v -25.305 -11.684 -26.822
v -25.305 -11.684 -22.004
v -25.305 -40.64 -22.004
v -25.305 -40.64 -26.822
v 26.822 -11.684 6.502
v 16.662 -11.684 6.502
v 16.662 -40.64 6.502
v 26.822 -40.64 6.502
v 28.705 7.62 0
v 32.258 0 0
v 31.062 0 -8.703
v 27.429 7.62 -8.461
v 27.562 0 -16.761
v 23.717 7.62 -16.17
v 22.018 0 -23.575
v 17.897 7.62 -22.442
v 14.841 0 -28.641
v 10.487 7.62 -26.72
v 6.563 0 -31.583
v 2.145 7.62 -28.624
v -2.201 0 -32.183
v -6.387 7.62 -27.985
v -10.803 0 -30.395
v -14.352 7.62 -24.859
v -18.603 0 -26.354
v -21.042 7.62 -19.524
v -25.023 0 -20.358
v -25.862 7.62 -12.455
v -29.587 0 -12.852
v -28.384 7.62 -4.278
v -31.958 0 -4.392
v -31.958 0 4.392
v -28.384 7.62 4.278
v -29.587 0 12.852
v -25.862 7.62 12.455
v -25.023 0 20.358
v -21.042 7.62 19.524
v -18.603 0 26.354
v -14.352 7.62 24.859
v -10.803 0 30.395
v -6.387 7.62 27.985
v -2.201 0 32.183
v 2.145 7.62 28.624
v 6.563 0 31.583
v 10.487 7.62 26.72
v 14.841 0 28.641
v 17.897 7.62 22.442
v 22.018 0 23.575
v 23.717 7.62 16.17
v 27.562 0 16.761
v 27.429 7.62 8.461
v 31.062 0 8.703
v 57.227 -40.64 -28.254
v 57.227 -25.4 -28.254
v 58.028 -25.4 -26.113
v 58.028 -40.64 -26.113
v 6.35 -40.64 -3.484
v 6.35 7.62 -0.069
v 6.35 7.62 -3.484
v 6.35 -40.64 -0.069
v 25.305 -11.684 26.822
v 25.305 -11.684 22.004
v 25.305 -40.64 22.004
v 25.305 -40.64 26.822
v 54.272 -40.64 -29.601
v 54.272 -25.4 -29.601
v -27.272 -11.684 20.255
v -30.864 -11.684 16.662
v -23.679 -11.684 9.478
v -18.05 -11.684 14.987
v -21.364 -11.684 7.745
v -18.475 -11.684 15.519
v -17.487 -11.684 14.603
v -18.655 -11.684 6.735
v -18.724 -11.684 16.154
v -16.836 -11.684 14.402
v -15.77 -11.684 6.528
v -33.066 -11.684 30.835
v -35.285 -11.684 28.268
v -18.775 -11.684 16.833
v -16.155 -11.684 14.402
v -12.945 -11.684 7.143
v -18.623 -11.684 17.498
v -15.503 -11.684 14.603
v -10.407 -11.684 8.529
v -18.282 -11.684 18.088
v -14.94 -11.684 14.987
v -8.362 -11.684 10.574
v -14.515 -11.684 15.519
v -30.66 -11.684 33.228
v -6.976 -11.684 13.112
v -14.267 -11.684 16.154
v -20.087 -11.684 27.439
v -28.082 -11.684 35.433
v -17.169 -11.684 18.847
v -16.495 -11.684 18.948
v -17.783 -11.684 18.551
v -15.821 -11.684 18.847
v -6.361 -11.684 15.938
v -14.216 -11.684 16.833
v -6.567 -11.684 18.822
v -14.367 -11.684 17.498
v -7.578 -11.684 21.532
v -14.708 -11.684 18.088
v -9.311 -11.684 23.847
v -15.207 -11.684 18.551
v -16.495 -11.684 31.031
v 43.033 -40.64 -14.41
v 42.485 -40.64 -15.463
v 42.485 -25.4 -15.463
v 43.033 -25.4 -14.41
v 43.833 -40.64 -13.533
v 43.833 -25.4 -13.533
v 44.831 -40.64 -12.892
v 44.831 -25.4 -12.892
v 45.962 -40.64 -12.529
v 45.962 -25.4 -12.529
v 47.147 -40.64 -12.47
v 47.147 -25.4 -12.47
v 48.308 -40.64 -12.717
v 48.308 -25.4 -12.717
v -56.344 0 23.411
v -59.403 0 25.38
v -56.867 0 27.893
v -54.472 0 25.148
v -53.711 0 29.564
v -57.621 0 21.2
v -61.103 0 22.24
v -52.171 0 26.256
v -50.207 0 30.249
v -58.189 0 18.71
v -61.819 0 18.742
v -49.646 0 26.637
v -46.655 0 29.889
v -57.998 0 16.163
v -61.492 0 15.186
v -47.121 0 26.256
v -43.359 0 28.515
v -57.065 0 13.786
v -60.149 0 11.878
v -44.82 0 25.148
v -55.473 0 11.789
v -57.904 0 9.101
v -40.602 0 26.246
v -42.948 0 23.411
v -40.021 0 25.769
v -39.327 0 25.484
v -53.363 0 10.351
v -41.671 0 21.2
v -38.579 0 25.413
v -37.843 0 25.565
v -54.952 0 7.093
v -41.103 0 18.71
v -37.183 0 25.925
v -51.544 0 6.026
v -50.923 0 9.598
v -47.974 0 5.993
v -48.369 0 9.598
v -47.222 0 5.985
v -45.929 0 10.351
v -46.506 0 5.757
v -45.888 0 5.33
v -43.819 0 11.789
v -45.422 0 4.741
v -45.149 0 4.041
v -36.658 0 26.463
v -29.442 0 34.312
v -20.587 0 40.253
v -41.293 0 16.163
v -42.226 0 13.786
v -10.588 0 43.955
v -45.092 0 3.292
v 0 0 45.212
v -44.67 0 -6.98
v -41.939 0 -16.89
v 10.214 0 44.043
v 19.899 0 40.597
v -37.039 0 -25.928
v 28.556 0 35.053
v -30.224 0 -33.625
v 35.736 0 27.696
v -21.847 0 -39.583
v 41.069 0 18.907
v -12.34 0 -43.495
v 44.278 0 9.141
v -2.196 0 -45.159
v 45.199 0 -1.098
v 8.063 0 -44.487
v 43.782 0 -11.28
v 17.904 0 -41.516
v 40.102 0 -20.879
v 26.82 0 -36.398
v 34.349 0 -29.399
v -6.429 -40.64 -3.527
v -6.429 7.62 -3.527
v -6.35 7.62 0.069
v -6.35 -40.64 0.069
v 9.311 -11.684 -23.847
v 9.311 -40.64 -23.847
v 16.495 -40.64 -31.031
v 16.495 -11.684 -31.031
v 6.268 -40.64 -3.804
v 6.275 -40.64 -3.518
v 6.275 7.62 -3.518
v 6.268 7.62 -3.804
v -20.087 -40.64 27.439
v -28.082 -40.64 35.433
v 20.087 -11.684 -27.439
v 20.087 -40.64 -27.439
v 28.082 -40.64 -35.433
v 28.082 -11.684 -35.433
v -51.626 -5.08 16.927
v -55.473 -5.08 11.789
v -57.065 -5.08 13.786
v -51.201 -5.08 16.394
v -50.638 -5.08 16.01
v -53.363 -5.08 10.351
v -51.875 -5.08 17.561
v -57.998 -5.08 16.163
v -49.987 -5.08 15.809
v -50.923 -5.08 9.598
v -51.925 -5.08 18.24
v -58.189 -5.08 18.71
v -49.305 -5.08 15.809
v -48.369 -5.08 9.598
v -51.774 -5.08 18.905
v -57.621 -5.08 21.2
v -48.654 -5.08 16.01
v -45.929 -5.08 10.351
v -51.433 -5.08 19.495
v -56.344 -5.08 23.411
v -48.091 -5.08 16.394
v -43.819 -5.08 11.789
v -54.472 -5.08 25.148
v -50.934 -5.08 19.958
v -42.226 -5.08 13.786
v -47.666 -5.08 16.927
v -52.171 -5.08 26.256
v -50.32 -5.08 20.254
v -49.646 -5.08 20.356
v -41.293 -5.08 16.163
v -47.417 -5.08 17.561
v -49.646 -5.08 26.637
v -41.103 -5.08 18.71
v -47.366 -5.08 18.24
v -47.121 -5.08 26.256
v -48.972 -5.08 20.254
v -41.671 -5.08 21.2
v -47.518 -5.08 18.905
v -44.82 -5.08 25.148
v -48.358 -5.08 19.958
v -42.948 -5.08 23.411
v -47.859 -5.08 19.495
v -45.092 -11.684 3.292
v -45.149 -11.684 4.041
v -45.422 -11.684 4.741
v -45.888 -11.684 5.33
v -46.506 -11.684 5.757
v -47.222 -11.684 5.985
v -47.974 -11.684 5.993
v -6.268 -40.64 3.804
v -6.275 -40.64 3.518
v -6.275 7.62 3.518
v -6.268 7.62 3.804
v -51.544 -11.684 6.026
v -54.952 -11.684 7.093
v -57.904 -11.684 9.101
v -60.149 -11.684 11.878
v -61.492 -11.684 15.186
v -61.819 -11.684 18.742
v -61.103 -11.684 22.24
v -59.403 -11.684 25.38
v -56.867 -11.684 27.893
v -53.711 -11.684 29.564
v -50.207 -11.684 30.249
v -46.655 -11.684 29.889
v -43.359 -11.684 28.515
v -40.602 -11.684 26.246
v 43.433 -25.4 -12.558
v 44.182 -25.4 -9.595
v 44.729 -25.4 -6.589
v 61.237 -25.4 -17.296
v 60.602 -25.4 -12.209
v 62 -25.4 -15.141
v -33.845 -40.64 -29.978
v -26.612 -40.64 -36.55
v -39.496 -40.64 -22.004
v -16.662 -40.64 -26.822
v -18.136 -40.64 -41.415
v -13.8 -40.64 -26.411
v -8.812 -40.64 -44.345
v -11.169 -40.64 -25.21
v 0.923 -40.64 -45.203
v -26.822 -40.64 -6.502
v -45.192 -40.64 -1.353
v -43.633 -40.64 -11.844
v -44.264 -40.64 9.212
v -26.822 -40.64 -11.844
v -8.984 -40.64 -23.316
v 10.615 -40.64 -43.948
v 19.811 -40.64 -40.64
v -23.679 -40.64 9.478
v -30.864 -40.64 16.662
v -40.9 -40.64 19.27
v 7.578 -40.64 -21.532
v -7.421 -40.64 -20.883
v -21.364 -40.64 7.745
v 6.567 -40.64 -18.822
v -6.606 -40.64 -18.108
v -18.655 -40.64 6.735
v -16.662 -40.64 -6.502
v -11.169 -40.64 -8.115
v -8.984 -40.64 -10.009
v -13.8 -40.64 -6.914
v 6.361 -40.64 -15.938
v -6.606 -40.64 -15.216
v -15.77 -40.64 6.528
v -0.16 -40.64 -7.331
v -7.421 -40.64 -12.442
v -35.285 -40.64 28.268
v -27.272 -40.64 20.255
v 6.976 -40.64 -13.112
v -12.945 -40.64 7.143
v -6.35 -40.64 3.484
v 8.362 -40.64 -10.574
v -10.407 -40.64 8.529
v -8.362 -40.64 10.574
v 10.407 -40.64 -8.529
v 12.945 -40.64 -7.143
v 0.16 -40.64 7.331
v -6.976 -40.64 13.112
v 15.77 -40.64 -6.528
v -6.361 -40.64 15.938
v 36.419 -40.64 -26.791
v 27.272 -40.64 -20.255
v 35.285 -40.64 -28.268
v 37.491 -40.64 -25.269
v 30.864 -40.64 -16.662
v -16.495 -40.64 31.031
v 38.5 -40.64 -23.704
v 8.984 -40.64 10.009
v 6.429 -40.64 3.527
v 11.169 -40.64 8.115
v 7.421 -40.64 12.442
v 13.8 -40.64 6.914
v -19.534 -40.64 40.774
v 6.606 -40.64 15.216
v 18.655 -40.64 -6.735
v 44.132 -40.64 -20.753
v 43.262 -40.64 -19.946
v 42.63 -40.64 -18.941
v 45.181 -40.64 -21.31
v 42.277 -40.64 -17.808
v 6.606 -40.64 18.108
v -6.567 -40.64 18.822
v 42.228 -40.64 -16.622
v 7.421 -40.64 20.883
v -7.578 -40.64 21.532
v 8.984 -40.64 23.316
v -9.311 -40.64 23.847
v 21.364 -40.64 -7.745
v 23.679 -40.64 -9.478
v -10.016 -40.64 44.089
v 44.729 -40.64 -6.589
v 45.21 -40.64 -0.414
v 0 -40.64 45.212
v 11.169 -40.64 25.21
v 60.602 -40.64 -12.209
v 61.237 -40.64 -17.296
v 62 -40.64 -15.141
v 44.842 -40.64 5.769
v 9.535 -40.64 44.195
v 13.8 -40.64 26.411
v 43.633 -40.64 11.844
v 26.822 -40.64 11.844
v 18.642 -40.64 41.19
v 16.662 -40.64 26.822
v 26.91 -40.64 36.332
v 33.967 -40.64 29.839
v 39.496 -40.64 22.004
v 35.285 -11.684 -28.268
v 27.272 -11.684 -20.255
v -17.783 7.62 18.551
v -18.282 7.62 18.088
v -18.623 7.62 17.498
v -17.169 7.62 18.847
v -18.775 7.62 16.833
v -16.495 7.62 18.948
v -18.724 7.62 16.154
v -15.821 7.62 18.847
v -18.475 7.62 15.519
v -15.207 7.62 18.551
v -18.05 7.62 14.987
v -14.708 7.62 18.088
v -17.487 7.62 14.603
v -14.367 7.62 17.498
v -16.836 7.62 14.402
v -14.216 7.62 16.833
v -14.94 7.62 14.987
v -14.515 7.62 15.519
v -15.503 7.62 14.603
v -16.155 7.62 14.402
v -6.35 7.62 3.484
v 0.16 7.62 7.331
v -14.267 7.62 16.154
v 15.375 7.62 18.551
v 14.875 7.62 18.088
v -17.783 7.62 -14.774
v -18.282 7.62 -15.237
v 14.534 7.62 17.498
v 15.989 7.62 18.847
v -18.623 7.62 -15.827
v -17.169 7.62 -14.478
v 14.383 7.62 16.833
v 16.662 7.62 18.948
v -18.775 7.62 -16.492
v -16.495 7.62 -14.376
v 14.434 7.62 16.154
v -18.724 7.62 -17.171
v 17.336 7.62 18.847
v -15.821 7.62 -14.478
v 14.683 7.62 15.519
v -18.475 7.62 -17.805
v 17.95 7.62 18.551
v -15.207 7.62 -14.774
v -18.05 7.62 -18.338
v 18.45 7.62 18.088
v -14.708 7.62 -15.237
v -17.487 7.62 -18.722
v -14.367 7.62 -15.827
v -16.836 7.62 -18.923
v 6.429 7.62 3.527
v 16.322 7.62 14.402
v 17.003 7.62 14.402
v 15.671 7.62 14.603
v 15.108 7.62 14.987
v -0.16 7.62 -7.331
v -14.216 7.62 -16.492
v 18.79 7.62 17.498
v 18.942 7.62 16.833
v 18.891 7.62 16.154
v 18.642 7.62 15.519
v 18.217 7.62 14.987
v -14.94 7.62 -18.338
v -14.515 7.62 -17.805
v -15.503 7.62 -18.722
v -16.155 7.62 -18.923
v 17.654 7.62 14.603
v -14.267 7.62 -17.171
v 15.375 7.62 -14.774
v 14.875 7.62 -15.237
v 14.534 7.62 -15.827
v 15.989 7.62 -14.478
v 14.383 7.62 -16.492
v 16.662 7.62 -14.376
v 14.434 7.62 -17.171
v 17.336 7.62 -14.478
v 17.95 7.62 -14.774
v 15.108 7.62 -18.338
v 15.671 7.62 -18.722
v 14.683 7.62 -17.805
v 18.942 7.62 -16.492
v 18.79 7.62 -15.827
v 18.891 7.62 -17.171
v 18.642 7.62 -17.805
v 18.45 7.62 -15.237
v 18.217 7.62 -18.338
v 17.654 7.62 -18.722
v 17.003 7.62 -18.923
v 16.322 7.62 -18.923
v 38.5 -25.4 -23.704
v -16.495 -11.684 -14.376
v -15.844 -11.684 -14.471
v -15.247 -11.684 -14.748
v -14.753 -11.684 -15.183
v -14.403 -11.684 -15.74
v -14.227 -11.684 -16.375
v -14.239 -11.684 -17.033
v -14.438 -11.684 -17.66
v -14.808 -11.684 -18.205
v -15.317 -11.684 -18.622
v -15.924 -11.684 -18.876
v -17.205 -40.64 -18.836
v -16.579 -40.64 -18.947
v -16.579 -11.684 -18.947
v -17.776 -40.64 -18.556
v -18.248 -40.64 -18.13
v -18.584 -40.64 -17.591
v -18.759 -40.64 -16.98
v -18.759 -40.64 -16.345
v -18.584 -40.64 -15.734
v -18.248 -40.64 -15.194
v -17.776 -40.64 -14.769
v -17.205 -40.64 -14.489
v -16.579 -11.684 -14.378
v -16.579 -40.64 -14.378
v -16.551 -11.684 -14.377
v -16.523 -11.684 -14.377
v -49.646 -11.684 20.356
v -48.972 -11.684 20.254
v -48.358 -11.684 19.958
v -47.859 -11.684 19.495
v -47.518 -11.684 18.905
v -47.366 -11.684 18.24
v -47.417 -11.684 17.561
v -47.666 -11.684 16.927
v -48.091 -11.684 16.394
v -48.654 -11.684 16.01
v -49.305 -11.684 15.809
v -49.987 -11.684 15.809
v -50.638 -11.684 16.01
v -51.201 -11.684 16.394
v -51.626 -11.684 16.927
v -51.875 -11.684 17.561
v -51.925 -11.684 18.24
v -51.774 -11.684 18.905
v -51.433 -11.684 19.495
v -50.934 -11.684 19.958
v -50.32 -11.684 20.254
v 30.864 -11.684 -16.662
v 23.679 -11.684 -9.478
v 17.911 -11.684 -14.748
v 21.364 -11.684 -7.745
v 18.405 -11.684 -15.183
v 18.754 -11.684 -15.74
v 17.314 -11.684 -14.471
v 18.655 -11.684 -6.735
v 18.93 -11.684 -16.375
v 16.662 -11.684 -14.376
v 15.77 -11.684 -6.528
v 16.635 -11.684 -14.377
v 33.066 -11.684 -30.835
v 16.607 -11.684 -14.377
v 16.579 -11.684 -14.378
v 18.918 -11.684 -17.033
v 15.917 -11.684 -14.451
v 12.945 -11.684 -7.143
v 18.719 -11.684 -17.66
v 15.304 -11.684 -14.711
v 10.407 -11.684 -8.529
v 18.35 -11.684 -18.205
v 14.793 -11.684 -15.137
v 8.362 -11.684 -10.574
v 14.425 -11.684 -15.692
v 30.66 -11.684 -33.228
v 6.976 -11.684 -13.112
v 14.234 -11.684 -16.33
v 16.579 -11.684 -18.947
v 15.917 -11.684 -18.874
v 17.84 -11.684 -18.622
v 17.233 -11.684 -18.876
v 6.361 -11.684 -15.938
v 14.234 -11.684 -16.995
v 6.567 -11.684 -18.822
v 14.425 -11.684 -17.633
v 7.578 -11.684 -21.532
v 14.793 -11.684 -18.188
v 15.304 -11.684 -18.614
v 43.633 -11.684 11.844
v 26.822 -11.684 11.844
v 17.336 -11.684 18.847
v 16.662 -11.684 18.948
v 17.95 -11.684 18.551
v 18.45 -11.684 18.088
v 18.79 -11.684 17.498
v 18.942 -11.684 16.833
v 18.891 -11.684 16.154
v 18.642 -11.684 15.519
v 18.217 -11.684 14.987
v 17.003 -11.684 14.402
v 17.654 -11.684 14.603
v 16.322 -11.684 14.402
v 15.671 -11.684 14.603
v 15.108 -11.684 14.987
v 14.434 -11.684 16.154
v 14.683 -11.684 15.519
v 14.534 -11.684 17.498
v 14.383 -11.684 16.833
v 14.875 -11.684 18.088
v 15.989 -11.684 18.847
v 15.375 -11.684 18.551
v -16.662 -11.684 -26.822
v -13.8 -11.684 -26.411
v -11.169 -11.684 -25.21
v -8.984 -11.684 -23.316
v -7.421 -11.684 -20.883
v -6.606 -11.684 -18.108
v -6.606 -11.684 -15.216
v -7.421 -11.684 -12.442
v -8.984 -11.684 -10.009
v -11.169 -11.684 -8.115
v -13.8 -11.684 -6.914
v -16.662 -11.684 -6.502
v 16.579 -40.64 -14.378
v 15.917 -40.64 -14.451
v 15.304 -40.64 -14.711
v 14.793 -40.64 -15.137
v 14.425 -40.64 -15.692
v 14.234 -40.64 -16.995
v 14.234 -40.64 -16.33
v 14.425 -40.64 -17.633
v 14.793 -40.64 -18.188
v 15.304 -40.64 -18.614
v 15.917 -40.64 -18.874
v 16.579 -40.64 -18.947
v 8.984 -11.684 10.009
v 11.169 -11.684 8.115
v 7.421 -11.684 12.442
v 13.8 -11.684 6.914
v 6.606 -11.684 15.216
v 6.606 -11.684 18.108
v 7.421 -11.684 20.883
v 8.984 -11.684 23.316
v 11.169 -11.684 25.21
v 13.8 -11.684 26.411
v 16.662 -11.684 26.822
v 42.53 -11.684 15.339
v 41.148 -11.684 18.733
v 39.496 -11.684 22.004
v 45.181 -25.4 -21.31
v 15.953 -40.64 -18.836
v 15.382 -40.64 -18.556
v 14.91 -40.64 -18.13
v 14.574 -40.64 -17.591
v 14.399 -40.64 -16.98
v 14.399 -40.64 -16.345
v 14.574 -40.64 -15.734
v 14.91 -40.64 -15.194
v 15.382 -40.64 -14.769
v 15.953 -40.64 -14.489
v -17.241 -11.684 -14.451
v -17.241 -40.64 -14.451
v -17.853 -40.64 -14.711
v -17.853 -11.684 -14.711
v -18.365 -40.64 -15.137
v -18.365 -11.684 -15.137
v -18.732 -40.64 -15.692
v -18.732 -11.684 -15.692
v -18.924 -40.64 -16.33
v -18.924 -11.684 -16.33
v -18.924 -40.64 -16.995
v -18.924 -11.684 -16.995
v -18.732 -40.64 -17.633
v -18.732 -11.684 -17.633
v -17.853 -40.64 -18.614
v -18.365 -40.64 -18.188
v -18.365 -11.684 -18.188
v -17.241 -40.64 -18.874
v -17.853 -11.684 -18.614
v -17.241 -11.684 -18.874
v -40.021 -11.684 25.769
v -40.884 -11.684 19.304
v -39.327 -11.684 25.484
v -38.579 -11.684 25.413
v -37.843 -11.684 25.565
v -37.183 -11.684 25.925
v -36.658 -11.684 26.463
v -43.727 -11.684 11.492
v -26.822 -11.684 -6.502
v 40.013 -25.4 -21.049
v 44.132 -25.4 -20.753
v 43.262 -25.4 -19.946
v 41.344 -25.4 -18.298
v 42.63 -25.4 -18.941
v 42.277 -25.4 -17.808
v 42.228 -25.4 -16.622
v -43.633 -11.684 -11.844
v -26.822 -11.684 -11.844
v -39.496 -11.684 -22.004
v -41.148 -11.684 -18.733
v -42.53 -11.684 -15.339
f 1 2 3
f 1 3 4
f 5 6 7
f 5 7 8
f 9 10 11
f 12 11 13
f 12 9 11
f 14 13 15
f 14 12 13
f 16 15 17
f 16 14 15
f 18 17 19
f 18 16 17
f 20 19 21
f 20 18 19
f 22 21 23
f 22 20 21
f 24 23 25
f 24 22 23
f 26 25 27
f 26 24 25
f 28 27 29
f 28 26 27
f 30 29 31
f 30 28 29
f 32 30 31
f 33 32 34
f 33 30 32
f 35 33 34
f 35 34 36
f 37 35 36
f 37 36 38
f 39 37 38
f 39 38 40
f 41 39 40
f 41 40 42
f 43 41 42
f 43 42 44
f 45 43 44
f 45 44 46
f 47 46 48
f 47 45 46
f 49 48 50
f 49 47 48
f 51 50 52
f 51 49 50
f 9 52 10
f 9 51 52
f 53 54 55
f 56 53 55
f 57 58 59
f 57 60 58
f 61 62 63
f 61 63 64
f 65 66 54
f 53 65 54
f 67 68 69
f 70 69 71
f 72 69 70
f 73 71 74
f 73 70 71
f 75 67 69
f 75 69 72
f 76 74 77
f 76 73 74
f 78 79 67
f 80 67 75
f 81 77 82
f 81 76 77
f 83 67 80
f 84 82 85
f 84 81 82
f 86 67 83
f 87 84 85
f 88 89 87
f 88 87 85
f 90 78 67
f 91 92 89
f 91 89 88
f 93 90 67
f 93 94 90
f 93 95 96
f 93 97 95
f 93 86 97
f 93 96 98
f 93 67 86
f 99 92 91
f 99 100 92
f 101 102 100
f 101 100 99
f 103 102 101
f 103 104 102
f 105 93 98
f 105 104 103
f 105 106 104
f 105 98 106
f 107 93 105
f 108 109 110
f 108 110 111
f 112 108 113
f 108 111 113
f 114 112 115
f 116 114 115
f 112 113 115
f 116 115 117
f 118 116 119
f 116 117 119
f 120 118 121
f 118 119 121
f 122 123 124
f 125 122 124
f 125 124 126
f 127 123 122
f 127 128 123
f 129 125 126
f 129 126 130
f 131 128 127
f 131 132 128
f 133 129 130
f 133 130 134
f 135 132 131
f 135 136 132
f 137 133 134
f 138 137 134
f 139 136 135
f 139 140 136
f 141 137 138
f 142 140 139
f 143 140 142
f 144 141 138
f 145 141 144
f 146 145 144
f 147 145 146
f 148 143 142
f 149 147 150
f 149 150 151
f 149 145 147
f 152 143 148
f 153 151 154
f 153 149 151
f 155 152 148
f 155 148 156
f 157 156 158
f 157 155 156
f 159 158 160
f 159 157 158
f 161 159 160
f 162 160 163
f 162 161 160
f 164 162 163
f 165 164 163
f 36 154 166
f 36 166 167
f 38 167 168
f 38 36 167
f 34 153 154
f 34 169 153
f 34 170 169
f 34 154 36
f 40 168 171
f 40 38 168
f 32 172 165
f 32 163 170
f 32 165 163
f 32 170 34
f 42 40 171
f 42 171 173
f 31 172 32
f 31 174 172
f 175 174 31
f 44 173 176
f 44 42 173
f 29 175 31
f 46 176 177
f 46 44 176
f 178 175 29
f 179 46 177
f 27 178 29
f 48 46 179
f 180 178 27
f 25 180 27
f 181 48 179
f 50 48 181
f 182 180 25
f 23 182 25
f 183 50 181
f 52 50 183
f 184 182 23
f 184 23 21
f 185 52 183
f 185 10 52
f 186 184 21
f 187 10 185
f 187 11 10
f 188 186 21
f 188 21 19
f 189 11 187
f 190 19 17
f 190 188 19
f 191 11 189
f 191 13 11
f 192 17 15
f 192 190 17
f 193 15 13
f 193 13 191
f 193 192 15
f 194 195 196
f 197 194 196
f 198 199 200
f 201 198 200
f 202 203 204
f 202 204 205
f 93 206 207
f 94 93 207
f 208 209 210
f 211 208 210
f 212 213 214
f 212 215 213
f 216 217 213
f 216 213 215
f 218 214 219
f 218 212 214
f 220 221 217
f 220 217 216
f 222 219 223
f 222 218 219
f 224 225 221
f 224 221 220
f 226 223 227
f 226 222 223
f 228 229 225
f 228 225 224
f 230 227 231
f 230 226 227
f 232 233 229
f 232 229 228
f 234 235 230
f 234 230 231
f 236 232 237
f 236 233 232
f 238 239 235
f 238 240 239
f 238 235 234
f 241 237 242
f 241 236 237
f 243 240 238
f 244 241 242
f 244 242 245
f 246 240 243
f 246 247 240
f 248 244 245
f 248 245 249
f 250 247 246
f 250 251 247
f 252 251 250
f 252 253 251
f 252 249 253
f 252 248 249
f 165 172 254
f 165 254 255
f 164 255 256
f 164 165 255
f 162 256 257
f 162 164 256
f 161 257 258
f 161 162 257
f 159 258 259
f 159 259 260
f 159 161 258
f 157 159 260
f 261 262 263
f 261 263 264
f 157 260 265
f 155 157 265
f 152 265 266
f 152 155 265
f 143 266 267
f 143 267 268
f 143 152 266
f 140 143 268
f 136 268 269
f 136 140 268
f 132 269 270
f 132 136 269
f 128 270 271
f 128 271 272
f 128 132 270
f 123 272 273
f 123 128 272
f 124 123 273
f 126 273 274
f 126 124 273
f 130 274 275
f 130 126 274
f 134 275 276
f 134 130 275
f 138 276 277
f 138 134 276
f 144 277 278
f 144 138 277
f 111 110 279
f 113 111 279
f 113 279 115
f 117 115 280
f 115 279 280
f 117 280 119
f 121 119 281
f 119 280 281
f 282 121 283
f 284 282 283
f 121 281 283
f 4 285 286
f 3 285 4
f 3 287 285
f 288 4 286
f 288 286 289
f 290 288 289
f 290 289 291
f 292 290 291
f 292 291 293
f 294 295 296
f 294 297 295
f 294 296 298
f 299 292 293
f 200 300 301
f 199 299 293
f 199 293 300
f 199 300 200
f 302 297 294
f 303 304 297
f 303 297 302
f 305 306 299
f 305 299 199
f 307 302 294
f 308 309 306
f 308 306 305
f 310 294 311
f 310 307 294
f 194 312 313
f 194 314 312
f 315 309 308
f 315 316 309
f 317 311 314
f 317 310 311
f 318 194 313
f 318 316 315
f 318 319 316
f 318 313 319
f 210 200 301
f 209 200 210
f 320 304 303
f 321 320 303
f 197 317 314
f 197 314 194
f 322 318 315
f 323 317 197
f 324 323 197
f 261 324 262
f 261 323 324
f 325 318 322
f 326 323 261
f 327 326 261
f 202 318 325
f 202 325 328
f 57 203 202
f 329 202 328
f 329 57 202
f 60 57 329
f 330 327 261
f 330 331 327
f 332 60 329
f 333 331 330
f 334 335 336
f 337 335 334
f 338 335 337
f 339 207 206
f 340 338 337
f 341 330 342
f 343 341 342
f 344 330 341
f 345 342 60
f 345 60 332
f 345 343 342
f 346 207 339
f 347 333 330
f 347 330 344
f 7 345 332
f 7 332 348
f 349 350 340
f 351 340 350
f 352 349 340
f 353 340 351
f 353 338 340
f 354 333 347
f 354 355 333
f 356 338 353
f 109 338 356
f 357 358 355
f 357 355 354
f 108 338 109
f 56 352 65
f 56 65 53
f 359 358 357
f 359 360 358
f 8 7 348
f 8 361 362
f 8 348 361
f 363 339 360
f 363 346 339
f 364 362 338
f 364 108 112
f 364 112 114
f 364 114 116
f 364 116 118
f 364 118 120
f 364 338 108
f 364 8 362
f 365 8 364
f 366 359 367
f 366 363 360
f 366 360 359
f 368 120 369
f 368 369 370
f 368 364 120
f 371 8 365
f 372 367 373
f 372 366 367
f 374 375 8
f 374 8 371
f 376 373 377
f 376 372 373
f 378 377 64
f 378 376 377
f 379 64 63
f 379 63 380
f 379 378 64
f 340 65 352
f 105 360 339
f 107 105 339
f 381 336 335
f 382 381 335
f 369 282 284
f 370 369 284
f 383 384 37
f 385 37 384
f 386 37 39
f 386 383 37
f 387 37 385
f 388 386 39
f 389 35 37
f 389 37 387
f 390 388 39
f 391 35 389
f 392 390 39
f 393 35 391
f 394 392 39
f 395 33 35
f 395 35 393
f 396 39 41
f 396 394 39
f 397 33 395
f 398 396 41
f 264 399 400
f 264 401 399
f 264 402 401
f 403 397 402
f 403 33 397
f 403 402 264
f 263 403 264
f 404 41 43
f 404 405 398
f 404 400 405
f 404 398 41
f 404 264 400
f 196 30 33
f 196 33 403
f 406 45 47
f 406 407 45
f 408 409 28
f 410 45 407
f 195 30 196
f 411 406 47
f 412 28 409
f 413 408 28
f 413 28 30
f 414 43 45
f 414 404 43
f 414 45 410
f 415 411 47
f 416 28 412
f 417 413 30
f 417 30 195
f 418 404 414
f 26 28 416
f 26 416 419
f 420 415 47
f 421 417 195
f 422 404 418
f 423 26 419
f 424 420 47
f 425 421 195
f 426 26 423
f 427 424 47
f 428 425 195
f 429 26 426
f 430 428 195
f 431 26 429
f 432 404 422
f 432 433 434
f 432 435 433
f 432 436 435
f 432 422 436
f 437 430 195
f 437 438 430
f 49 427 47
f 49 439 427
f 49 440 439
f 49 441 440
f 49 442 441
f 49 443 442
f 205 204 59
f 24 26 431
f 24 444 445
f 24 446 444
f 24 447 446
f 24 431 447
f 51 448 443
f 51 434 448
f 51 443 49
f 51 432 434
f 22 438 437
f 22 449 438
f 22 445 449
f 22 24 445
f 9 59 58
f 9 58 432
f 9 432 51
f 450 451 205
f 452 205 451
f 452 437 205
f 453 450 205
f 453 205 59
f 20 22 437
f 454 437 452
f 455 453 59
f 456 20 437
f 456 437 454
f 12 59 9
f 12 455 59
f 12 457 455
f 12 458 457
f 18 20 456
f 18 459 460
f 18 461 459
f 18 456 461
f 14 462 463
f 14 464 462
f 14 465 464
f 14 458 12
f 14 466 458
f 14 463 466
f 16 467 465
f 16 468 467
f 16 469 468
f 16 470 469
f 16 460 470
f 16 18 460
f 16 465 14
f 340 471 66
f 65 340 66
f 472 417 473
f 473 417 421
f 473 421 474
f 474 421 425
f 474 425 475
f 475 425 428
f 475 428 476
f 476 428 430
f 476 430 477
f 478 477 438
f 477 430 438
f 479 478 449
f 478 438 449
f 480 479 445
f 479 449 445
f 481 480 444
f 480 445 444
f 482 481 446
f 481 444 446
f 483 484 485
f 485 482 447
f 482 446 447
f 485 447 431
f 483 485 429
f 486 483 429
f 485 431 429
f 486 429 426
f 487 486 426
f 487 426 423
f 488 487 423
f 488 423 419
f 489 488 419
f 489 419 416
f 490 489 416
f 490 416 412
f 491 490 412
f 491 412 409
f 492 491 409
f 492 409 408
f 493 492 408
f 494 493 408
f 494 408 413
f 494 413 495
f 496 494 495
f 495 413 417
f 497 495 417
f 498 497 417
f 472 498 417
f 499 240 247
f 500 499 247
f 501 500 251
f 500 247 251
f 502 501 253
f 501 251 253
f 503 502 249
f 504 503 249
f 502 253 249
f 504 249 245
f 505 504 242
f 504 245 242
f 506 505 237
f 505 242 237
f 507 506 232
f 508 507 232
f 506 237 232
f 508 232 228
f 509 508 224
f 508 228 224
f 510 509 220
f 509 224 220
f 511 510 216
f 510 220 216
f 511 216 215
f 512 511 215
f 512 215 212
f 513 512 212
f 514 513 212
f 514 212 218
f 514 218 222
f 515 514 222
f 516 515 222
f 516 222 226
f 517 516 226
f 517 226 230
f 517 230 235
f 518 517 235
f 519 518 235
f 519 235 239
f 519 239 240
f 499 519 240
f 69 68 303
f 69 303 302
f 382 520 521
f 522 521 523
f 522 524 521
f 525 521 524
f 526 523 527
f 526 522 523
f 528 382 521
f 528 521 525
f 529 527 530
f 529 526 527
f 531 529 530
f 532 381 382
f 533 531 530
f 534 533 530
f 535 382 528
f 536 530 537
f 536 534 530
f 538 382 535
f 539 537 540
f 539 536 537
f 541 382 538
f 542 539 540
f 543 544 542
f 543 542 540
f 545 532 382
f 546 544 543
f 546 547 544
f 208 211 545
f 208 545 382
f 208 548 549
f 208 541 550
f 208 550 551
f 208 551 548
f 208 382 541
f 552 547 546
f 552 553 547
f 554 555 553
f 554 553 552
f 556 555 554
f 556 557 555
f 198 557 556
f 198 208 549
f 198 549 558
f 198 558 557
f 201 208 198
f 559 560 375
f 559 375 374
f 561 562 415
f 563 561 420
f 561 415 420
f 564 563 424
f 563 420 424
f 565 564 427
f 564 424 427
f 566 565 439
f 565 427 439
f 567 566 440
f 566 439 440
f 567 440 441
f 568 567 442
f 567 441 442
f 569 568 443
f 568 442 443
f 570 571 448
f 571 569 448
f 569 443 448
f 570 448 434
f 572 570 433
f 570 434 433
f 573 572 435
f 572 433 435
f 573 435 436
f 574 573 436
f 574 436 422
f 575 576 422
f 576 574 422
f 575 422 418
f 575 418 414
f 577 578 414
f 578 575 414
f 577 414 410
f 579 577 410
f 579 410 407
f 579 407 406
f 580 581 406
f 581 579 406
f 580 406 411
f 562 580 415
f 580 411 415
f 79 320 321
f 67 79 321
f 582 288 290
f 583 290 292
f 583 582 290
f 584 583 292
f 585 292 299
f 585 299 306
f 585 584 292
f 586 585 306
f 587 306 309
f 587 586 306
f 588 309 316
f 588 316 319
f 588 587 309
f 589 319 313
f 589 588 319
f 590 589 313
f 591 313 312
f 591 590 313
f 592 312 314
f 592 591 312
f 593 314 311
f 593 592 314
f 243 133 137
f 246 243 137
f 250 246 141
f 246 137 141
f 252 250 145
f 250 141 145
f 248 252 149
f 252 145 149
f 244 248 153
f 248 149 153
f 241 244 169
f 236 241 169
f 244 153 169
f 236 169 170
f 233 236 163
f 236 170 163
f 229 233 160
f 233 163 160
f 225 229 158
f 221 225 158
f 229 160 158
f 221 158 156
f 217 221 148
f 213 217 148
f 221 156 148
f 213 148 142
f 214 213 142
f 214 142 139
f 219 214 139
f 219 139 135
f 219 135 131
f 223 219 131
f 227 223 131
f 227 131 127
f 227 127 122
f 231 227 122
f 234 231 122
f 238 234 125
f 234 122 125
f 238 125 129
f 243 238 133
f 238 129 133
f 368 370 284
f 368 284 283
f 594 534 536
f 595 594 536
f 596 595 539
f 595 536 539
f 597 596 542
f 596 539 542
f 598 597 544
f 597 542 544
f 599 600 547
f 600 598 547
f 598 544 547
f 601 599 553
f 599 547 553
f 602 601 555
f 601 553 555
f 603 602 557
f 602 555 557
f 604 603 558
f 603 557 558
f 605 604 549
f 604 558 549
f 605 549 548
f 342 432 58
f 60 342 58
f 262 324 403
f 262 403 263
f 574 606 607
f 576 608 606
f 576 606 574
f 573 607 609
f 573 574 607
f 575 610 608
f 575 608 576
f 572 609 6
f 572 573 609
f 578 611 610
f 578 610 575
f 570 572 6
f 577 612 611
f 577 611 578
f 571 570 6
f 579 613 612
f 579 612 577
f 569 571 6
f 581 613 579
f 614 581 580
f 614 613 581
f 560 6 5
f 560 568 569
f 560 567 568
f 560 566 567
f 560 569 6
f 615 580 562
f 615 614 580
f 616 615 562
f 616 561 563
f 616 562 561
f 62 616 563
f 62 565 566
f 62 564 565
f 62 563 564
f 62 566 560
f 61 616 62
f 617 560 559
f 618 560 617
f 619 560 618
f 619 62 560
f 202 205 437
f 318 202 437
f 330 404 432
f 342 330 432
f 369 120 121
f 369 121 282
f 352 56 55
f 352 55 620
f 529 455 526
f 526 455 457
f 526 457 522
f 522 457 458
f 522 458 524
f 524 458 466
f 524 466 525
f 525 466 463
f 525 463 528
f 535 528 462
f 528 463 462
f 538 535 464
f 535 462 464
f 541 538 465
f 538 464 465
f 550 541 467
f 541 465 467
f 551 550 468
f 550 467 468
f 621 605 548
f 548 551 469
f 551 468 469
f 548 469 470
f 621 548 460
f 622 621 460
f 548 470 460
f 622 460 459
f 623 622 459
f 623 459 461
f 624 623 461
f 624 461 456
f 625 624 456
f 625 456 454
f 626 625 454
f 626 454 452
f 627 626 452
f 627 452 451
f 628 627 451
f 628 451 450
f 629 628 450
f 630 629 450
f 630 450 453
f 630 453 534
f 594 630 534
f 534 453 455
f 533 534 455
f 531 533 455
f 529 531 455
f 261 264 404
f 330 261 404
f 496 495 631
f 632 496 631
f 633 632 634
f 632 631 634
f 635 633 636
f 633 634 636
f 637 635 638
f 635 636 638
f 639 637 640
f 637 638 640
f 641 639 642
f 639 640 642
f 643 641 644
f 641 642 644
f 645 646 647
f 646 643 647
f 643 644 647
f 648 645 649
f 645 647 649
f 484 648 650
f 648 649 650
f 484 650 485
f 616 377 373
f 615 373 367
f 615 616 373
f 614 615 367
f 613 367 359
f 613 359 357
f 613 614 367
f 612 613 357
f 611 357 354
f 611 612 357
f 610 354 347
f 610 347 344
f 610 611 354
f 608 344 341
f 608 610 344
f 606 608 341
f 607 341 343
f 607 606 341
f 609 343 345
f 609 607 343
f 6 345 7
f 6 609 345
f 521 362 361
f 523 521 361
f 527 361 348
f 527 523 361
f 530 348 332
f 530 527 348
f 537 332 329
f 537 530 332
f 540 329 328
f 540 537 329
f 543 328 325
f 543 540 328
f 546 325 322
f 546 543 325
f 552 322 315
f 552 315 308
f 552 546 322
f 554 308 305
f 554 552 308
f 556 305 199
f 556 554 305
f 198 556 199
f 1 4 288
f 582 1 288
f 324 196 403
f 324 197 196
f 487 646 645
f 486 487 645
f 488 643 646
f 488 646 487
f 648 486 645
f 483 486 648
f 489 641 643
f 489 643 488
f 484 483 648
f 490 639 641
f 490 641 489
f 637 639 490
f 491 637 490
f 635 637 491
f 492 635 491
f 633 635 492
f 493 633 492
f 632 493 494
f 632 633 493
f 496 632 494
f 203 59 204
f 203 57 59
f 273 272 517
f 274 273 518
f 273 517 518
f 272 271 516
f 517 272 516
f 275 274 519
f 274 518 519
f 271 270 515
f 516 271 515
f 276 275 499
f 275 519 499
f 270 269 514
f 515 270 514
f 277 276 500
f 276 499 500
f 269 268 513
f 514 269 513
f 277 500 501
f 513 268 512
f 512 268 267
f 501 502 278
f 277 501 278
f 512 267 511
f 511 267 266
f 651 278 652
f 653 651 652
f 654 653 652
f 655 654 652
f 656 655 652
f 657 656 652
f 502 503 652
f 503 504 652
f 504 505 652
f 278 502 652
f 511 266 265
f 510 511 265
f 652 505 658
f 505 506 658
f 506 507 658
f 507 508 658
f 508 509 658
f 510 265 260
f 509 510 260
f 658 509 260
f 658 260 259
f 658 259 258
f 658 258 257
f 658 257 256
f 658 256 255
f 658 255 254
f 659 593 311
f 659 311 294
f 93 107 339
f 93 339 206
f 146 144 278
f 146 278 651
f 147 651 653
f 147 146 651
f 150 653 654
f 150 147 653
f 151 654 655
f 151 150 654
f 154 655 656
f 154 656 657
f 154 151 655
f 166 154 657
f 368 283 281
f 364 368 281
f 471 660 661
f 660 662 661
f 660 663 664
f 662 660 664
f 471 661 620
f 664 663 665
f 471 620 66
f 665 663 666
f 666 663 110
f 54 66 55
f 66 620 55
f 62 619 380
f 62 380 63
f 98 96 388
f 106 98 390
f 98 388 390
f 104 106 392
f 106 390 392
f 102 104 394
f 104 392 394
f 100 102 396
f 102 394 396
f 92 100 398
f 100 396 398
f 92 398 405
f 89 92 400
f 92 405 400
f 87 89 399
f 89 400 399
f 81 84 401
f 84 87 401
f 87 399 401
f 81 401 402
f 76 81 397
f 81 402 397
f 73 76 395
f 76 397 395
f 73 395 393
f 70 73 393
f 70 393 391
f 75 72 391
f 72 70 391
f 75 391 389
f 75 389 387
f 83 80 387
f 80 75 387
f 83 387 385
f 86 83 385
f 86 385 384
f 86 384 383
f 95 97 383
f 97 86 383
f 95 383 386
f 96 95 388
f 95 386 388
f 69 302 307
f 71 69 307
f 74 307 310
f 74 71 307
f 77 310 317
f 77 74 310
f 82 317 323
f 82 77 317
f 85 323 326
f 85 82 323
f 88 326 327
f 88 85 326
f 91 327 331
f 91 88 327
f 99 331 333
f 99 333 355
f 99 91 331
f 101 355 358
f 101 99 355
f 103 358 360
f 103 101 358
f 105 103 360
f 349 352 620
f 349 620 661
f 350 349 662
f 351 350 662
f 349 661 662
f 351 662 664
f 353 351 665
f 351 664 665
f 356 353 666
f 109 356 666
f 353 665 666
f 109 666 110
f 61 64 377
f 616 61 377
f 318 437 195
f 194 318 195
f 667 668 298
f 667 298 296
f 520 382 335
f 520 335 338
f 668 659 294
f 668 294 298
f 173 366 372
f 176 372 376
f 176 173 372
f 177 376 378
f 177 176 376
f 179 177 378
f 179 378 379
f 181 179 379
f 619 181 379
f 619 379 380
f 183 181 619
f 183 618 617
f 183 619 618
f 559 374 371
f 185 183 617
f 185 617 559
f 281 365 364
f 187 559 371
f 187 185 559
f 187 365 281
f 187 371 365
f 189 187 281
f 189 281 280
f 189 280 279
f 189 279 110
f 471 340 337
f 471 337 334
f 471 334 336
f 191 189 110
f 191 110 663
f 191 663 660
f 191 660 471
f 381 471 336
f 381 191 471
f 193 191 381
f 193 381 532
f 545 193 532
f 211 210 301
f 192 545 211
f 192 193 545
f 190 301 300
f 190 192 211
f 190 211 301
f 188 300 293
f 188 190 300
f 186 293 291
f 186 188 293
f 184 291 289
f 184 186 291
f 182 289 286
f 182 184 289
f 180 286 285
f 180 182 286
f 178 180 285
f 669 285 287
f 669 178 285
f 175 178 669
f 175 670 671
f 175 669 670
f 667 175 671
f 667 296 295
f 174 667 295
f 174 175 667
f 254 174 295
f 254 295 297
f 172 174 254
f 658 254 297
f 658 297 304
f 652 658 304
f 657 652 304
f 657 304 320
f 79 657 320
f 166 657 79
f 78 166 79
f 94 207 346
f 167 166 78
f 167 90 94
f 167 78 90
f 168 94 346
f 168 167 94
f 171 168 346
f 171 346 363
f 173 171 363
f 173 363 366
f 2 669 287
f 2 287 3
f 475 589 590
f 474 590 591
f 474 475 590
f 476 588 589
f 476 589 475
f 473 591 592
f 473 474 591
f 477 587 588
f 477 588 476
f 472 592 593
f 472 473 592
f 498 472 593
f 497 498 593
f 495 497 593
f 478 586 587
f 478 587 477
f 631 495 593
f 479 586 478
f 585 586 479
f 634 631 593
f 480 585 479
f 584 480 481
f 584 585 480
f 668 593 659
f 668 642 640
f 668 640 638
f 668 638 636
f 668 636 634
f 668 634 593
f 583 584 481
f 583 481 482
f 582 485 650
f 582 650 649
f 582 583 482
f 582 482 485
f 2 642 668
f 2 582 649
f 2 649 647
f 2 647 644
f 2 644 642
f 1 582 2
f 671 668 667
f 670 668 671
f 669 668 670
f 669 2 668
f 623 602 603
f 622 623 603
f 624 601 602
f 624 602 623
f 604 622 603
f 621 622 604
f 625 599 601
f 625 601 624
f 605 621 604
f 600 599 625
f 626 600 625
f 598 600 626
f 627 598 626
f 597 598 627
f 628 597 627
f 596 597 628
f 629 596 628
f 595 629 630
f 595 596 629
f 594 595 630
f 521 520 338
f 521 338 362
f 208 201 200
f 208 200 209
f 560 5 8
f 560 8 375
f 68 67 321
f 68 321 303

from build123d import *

# Parameters (mm, degrees)
SKETCH2_R           = 45.212
SKETCH2_R_2         = 32.258
BOSS_EXTRUDE3_DEPTH = 40.64
SKETCH4_R           = 32.258
BOSS_EXTRUDE4_DEPTH = 7.62
BOSS_EXTRUDE4_TAPER = 25
CUT_EXTRUDE1_DEPTH  = 81.10791158
SKETCH7_R           = 2.286
CUT_EXTRUDE2_DEPTH  = 81.107911519
BOSS_EXTRUDE8_START = -7.62
BOSS_EXTRUDE8_DEPTH = 11.684
SKETCH18_R          = 8.567257543
CUT_EXTRUDE3_DEPTH  = 5.08
SKETCH19_R          = 2.286
CUT_EXTRUDE4_DEPTH  = 85.454467418
BOSS_EXTRUDE9_START = -15.24
BOSS_EXTRUDE9_DEPTH = 15.24
CUT_EXTRUDE5_START  = -28.956
SKETCH21_R          = 2.286
CUT_EXTRUDE5_DEPTH  = 28.956
CIRPATTERN1_COUNT   = 2
CUT_EXTRUDE6_DEPTH  = 91.648631066


with BuildPart() as part:
    # Sketch2 → Boss-Extrude3 (new body)
    # profile 1 of 2: a face of its own
    with BuildSketch(Plane(origin=(0, 0, 0), x_dir=(1, 0, 0), z_dir=(0, 1, 0))):
        with Locations(Location((0, 0, 0), (0, 0, 270))):
            Circle(SKETCH2_R)
        Circle(SKETCH2_R_2, mode=Mode.SUBTRACT)
    # profile 2 of 2: a face of its own
    with BuildSketch(Plane(origin=(0, 0, 0), x_dir=(1, 0, 0), z_dir=(0, 1, 0))):
        Circle(SKETCH2_R_2)
        Polygon((0, 6.35), (-6.35, 3.483506942), (-6.35, -3.483506942), (0, -6.35), (6.35, -3.483506942), (6.35, 3.483506942), align=None, mode=Mode.SUBTRACT)
    extrude(amount=-BOSS_EXTRUDE3_DEPTH)

    # Sketch4 → Boss-Extrude4 (add)
    with BuildSketch(Plane(origin=(0, 0, 0), x_dir=(1, 0, 0), z_dir=(0, 1, 0))):
        Circle(SKETCH4_R)
    extrude(amount=BOSS_EXTRUDE4_DEPTH, taper=BOSS_EXTRUDE4_TAPER)

    # Sketch6 → Cut-Extrude1 (cut, through all)
    with BuildSketch(Plane(origin=(0, -40.64, 0), x_dir=(-1, 0, 0), z_dir=(0, -1, 0))):
        Polygon((6.35, -3.483506942), (0, -6.35), (-6.35, -3.483506942), (-6.35, 3.483506942), (0, 6.35), (6.35, 3.483506942), align=None)
    extrude(amount=-CUT_EXTRUDE1_DEPTH, mode=Mode.SUBTRACT)

    # Sketch7 → Cut-Extrude2 (cut, through all)
    with BuildSketch(Plane(origin=(0, 7.62, 0), x_dir=(1, 0, 0), z_dir=(0, 1, 0))):
        with Locations(Location((-16.495222192, 16.6624, 0), (0, 0, 270))):
            Circle(SKETCH7_R)
        with Locations(Location((16.6624, 16.6624, 0), (0, 0, 270))):
            Circle(SKETCH7_R)
        with Locations(Location((16.6624, -16.6624, 0), (0, 0, 270))):
            Circle(SKETCH7_R)
        with Locations(Location((-16.495222192, -16.6624, 0), (0, 0, 270))):
            Circle(SKETCH7_R)
    extrude(amount=-CUT_EXTRUDE2_DEPTH, mode=Mode.SUBTRACT)

    # Sketch12 → Boss-Extrude8 (add)
    with BuildSketch(Plane(origin=(0, 7.62, 0), x_dir=(1, 0, 0), z_dir=(0, 1, 0)).offset(BOSS_EXTRUDE8_START)):
        with BuildLine():
            ThreePointArc((-45.091998917, -3.291895759), (-45.888251869, -5.330050438), (-47.973633707, -5.992829324))
            ThreePointArc((-47.973633707, -5.992829324), (-61.102572974, -22.2395178), (-40.602051954, -26.246083736))
            ThreePointArc((-40.602051954, -26.246083736), (-38.578530729, -25.413344212), (-36.658465006, -26.462839746))
            ThreePointArc((-36.658465006, -26.462839746), (-42.485382771, -15.46341472), (-45.091998917, -3.291895759))
        make_face()
    extrude(amount=-BOSS_EXTRUDE8_DEPTH)

    # Sketch18 → Cut-Extrude3 (cut)
    with BuildSketch(Plane(origin=(0, 0, 0), x_dir=(1, 0, 0), z_dir=(0, 1, 0))):
        with Locations(Location((-49.645840541, -18.069608212, 0), (0, 0, 270))):
            Circle(SKETCH18_R)
    extrude(amount=-CUT_EXTRUDE3_DEPTH, mode=Mode.SUBTRACT)

    # Sketch19 → Cut-Extrude4 (cut, through all)
    with BuildSketch(Plane(origin=(0, -5.08, 0), x_dir=(1, 0, 0), z_dir=(0, 1, 0))):
        with Locations(Location((-49.645840541, -18.069608212, 0), (0, 0, 270))):
            Circle(SKETCH19_R)
    extrude(amount=-CUT_EXTRUDE4_DEPTH, mode=Mode.SUBTRACT)

    # Sketch20 → Boss-Extrude9 (add)
    with BuildSketch(Plane.XZ.offset(40.64).offset(BOSS_EXTRUDE9_START)):
        with BuildLine():
            ThreePointArc((42.485382852, -15.463414497), (44.831385262, -12.89196184), (48.307822394, -12.717373918))
            Line((48.307822394, -12.717373918), (61.237093085, -17.295868799))
            Line((61.237093085, -17.295868799), (62.000175566, -15.140990351))
            Line((62.000175566, -15.140990351), (60.601893265, -12.209430544))
            Line((60.601893265, -12.209430544), (44.72934622, -6.588666841))
            ThreePointArc((44.72934622, -6.588666841), (43.832551012, -11.082978649), (42.485382852, -15.463414497))
        make_face()
        with BuildLine():
            ThreePointArc((45.180509286, -21.309596065), (42.629626793, -18.941243028), (42.485382852, -15.463414497))
            ThreePointArc((42.485382852, -15.463414497), (40.701683588, -19.684966271), (38.499780526, -23.704257918))
            Line((38.499780526, -23.704257918), (54.271814253, -29.601179693))
            Line((54.271814253, -29.601179693), (57.22733096, -28.254273131))
            Line((57.22733096, -28.254273131), (58.027905034, -26.113040506))
            Line((58.027905034, -26.113040506), (45.180509286, -21.309596065))
        make_face()
    extrude(amount=BOSS_EXTRUDE9_DEPTH)

    # Sketch21 → Cut-Extrude5 (cut)
    # profile 1 of 2: a face of its own
    with BuildSketch(Plane.XZ.offset(40.64).offset(CUT_EXTRUDE5_START)):
        with BuildLine():
            Line((-20.08732464, 27.438707345), (-28.082012675, 35.43339538))
            ThreePointArc((-28.082012675, 35.43339538), (-31.885487137, 32.053715136), (-35.285134805, 28.268077504))
            Line((-35.285134805, 28.268077504), (-27.271504992, 20.254502449))
            Line((-27.271504992, 20.254502449), (-30.86360744, 16.662375455))
            Line((-30.86360744, 16.662375455), (-23.679427089, 9.478195103))
            ThreePointArc((-23.679427089, 9.478195103), (-9.311017295, 9.478195103), (-9.311017295, 23.846604897))
            Line((-9.311017295, 23.846604897), (-16.495222192, 31.030809794))
            Line((-16.495222192, 31.030809794), (-20.08732464, 27.438707345))
        make_face()
        with Locations(Location((-16.495222192, 16.6624, 0), (0, 0, 90))):
            Circle(SKETCH21_R, mode=Mode.SUBTRACT)
    # profile 2 of 2: a face of its own
    with BuildSketch(Plane.XZ.offset(40.64).offset(CUT_EXTRUDE5_START)):
        with BuildLine():
            ThreePointArc((16.6624, 26.8224), (6.5024, 16.6624), (16.6624, 6.5024))
            Line((16.6624, 6.5024), (26.8224, 6.5024))
            Line((26.8224, 6.5024), (26.8224, 11.844066963))
            Line((26.8224, 11.844066963), (43.63304965, 11.844066963))
            ThreePointArc((43.63304965, 11.844066963), (41.873887087, 17.050000709), (39.496151472, 22.004066963))
            Line((39.496151472, 22.004066963), (25.304864582, 22.004066963))
            Line((25.304864582, 22.004066963), (25.304864582, 26.8224))
            Line((25.304864582, 26.8224), (16.6624, 26.8224))
        make_face()
        with Locations(Location((16.6624, 16.6624, 0), (0, 0, 90))):
            Circle(SKETCH21_R, mode=Mode.SUBTRACT)
    cut_extrude5 = extrude(amount=CUT_EXTRUDE5_DEPTH, mode=Mode.SUBTRACT)

    # CirPattern1: Cut-Extrude5 ×2 about axis
    cirpattern1_axis = Axis((0, 0, 0), (0, 1, 0))
    for i in range(1, CIRPATTERN1_COUNT):
        add(cut_extrude5.rotate(cirpattern1_axis, i * 360 / CIRPATTERN1_COUNT), mode=Mode.SUBTRACT)

    # Sketch22 → Cut-Extrude6 (cut, through all)
    with BuildSketch(Plane(origin=(0, 7.62, 0), x_dir=(1, 0, 0), z_dir=(0, 1, 0))):
        Polygon((6.428560964, -3.526604212), (6.268409318, 3.803994999), (-0.160151646, 7.33059921), (-6.428560964, 3.526604212), (-6.268409318, -3.803994999), (0.160151646, -7.33059921), align=None)
    extrude(amount=-CUT_EXTRUDE6_DEPTH, mode=Mode.SUBTRACT)


solid = part.part
